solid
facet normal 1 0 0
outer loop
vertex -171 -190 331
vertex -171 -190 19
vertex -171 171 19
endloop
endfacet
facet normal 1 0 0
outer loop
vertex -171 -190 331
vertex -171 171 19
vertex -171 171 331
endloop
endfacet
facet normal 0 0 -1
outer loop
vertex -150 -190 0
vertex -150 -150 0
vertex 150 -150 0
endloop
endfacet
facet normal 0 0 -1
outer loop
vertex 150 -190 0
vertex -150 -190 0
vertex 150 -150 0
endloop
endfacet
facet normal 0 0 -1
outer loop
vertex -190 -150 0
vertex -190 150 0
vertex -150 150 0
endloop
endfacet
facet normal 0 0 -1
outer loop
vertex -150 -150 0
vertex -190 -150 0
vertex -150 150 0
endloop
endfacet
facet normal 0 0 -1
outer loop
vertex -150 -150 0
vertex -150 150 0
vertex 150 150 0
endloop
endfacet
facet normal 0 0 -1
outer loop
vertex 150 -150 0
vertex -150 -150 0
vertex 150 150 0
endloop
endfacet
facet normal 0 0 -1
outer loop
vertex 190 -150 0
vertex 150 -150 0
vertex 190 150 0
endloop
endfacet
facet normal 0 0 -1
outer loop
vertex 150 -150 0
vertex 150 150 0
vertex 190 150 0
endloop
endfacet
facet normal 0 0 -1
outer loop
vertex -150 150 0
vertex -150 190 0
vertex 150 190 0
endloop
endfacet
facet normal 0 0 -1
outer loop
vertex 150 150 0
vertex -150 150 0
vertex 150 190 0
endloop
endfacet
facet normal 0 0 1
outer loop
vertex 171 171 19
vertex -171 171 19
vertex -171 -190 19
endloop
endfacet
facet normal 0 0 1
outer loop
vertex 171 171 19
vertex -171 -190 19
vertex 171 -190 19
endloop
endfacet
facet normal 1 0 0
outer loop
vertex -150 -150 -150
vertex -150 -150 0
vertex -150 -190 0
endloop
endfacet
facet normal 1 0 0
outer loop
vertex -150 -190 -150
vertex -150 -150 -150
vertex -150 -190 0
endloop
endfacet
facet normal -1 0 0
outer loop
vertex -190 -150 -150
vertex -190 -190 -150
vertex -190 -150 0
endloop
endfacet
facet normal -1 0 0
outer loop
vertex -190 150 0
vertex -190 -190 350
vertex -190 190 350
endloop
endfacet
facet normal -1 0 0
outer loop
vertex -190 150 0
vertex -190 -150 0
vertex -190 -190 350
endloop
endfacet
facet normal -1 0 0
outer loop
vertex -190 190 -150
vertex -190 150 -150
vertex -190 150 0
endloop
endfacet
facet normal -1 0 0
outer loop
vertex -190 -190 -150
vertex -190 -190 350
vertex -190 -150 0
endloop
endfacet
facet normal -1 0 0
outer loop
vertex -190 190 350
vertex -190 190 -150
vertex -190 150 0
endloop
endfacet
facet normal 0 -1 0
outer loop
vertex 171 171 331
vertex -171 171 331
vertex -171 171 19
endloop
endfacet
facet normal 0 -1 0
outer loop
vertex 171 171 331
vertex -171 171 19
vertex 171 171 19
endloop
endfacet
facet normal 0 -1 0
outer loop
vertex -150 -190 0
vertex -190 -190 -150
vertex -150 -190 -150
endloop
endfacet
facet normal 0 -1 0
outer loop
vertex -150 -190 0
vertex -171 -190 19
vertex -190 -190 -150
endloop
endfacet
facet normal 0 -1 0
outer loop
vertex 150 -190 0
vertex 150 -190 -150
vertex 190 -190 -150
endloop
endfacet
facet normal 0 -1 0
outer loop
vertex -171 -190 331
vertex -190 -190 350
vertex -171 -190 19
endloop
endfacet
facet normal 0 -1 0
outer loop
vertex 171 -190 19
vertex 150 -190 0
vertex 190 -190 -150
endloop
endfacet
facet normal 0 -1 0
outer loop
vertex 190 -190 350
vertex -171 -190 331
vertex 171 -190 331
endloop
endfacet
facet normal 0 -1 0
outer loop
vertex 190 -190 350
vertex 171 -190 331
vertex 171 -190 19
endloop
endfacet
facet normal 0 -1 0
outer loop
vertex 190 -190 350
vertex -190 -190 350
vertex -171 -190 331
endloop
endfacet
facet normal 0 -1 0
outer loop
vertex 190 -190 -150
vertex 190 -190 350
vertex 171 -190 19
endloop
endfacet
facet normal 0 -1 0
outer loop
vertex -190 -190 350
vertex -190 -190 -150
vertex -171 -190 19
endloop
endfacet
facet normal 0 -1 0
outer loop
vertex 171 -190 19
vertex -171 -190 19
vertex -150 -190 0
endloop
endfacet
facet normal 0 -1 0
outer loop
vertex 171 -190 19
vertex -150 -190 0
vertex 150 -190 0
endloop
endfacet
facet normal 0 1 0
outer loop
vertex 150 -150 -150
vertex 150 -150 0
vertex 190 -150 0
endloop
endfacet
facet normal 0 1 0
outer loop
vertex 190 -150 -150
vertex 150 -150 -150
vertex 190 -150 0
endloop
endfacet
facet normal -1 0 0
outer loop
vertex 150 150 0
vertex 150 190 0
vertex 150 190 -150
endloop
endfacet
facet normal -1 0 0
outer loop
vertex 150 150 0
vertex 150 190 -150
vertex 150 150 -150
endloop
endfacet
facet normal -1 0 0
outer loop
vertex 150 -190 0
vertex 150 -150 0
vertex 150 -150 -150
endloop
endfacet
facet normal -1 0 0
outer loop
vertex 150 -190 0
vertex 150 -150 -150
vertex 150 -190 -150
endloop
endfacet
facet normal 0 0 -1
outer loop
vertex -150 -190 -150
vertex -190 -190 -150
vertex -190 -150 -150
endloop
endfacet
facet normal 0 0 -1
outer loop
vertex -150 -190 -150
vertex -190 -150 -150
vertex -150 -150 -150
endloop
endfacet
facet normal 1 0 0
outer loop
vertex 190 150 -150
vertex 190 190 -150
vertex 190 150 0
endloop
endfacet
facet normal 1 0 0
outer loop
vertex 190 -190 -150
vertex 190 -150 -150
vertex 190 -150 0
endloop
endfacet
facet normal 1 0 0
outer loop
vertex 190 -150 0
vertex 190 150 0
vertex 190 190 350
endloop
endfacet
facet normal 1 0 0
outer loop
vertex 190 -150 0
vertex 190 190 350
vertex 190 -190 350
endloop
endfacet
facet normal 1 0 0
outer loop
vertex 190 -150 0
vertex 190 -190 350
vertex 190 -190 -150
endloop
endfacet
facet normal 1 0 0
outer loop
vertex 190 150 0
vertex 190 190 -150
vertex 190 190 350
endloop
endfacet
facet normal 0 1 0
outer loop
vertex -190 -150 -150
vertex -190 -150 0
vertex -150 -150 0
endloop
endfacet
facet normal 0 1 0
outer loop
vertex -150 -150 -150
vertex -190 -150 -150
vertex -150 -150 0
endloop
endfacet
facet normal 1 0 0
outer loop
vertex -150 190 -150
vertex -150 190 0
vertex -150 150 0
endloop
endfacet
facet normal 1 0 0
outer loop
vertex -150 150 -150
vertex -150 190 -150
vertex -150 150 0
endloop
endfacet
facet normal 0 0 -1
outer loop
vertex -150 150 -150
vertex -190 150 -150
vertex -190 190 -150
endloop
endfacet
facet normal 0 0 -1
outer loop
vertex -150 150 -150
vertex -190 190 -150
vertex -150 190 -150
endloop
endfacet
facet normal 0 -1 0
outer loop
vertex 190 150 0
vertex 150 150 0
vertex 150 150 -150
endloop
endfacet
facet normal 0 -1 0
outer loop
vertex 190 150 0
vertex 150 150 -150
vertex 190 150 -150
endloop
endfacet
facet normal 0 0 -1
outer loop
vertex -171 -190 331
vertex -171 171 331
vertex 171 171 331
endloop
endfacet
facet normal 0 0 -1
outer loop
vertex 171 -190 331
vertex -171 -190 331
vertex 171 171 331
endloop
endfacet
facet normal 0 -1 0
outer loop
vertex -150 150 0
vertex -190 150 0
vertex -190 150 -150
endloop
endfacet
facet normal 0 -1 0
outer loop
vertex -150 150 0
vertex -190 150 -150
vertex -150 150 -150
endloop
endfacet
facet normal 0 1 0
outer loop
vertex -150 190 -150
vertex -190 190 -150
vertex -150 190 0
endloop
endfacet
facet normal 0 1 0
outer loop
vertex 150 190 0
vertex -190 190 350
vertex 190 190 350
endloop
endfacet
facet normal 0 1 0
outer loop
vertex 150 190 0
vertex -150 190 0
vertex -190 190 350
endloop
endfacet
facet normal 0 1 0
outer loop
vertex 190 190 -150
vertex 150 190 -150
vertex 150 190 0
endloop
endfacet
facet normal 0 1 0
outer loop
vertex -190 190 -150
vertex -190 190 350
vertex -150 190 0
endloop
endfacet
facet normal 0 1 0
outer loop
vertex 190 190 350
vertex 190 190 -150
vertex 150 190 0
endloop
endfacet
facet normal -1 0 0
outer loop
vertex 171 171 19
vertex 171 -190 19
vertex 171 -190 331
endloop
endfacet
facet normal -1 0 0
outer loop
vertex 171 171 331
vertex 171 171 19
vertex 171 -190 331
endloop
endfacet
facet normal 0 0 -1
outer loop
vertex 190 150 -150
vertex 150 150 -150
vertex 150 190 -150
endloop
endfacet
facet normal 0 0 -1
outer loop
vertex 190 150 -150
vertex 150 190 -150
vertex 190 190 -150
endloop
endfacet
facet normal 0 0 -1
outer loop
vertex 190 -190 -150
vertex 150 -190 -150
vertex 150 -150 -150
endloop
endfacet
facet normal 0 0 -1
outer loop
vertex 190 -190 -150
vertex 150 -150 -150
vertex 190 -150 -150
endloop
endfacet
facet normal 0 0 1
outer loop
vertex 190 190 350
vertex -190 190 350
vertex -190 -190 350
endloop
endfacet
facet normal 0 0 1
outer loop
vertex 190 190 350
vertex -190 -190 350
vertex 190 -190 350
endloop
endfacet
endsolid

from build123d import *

# Parameters (mm, degrees)
F0_W     = 380
F0_H     = 380
F1_DEPTH = 350
F2_W     = 342
F2_H     = 312
F3_DEPTH = 361
F4_W     = 40
F4_H     = 40
F5_DEPTH = 150


with BuildPart() as f1:
    # F0 (on Top) → F1 (new body)
    with BuildSketch(Plane.XY):
        Rectangle(F0_W, F0_H)
    extrude(amount=F1_DEPTH)

    # F2 (on face) → F3 (cut)
    with BuildSketch(Plane.XZ.offset(190)):
        with Locations((0, 175)):
            Rectangle(F2_W, F2_H)
    extrude(amount=-F3_DEPTH, mode=Mode.SUBTRACT)

    # F4 (on face) → F5 (join)
    with BuildSketch(Plane(origin=(0, 0, 0), x_dir=(1, 0, 0), z_dir=(0, 0, -1))):
        with Locations((170, 170)):
            Rectangle(F4_W, F4_H)
        with Locations((-170, 170)):
            Rectangle(F4_W, F4_H)
        with Locations((-170, -170)):
            Rectangle(F4_W, F4_H)
        with Locations((170, -170)):
            Rectangle(F4_W, F4_H)
    extrude(amount=F5_DEPTH)


solid = f1.part
